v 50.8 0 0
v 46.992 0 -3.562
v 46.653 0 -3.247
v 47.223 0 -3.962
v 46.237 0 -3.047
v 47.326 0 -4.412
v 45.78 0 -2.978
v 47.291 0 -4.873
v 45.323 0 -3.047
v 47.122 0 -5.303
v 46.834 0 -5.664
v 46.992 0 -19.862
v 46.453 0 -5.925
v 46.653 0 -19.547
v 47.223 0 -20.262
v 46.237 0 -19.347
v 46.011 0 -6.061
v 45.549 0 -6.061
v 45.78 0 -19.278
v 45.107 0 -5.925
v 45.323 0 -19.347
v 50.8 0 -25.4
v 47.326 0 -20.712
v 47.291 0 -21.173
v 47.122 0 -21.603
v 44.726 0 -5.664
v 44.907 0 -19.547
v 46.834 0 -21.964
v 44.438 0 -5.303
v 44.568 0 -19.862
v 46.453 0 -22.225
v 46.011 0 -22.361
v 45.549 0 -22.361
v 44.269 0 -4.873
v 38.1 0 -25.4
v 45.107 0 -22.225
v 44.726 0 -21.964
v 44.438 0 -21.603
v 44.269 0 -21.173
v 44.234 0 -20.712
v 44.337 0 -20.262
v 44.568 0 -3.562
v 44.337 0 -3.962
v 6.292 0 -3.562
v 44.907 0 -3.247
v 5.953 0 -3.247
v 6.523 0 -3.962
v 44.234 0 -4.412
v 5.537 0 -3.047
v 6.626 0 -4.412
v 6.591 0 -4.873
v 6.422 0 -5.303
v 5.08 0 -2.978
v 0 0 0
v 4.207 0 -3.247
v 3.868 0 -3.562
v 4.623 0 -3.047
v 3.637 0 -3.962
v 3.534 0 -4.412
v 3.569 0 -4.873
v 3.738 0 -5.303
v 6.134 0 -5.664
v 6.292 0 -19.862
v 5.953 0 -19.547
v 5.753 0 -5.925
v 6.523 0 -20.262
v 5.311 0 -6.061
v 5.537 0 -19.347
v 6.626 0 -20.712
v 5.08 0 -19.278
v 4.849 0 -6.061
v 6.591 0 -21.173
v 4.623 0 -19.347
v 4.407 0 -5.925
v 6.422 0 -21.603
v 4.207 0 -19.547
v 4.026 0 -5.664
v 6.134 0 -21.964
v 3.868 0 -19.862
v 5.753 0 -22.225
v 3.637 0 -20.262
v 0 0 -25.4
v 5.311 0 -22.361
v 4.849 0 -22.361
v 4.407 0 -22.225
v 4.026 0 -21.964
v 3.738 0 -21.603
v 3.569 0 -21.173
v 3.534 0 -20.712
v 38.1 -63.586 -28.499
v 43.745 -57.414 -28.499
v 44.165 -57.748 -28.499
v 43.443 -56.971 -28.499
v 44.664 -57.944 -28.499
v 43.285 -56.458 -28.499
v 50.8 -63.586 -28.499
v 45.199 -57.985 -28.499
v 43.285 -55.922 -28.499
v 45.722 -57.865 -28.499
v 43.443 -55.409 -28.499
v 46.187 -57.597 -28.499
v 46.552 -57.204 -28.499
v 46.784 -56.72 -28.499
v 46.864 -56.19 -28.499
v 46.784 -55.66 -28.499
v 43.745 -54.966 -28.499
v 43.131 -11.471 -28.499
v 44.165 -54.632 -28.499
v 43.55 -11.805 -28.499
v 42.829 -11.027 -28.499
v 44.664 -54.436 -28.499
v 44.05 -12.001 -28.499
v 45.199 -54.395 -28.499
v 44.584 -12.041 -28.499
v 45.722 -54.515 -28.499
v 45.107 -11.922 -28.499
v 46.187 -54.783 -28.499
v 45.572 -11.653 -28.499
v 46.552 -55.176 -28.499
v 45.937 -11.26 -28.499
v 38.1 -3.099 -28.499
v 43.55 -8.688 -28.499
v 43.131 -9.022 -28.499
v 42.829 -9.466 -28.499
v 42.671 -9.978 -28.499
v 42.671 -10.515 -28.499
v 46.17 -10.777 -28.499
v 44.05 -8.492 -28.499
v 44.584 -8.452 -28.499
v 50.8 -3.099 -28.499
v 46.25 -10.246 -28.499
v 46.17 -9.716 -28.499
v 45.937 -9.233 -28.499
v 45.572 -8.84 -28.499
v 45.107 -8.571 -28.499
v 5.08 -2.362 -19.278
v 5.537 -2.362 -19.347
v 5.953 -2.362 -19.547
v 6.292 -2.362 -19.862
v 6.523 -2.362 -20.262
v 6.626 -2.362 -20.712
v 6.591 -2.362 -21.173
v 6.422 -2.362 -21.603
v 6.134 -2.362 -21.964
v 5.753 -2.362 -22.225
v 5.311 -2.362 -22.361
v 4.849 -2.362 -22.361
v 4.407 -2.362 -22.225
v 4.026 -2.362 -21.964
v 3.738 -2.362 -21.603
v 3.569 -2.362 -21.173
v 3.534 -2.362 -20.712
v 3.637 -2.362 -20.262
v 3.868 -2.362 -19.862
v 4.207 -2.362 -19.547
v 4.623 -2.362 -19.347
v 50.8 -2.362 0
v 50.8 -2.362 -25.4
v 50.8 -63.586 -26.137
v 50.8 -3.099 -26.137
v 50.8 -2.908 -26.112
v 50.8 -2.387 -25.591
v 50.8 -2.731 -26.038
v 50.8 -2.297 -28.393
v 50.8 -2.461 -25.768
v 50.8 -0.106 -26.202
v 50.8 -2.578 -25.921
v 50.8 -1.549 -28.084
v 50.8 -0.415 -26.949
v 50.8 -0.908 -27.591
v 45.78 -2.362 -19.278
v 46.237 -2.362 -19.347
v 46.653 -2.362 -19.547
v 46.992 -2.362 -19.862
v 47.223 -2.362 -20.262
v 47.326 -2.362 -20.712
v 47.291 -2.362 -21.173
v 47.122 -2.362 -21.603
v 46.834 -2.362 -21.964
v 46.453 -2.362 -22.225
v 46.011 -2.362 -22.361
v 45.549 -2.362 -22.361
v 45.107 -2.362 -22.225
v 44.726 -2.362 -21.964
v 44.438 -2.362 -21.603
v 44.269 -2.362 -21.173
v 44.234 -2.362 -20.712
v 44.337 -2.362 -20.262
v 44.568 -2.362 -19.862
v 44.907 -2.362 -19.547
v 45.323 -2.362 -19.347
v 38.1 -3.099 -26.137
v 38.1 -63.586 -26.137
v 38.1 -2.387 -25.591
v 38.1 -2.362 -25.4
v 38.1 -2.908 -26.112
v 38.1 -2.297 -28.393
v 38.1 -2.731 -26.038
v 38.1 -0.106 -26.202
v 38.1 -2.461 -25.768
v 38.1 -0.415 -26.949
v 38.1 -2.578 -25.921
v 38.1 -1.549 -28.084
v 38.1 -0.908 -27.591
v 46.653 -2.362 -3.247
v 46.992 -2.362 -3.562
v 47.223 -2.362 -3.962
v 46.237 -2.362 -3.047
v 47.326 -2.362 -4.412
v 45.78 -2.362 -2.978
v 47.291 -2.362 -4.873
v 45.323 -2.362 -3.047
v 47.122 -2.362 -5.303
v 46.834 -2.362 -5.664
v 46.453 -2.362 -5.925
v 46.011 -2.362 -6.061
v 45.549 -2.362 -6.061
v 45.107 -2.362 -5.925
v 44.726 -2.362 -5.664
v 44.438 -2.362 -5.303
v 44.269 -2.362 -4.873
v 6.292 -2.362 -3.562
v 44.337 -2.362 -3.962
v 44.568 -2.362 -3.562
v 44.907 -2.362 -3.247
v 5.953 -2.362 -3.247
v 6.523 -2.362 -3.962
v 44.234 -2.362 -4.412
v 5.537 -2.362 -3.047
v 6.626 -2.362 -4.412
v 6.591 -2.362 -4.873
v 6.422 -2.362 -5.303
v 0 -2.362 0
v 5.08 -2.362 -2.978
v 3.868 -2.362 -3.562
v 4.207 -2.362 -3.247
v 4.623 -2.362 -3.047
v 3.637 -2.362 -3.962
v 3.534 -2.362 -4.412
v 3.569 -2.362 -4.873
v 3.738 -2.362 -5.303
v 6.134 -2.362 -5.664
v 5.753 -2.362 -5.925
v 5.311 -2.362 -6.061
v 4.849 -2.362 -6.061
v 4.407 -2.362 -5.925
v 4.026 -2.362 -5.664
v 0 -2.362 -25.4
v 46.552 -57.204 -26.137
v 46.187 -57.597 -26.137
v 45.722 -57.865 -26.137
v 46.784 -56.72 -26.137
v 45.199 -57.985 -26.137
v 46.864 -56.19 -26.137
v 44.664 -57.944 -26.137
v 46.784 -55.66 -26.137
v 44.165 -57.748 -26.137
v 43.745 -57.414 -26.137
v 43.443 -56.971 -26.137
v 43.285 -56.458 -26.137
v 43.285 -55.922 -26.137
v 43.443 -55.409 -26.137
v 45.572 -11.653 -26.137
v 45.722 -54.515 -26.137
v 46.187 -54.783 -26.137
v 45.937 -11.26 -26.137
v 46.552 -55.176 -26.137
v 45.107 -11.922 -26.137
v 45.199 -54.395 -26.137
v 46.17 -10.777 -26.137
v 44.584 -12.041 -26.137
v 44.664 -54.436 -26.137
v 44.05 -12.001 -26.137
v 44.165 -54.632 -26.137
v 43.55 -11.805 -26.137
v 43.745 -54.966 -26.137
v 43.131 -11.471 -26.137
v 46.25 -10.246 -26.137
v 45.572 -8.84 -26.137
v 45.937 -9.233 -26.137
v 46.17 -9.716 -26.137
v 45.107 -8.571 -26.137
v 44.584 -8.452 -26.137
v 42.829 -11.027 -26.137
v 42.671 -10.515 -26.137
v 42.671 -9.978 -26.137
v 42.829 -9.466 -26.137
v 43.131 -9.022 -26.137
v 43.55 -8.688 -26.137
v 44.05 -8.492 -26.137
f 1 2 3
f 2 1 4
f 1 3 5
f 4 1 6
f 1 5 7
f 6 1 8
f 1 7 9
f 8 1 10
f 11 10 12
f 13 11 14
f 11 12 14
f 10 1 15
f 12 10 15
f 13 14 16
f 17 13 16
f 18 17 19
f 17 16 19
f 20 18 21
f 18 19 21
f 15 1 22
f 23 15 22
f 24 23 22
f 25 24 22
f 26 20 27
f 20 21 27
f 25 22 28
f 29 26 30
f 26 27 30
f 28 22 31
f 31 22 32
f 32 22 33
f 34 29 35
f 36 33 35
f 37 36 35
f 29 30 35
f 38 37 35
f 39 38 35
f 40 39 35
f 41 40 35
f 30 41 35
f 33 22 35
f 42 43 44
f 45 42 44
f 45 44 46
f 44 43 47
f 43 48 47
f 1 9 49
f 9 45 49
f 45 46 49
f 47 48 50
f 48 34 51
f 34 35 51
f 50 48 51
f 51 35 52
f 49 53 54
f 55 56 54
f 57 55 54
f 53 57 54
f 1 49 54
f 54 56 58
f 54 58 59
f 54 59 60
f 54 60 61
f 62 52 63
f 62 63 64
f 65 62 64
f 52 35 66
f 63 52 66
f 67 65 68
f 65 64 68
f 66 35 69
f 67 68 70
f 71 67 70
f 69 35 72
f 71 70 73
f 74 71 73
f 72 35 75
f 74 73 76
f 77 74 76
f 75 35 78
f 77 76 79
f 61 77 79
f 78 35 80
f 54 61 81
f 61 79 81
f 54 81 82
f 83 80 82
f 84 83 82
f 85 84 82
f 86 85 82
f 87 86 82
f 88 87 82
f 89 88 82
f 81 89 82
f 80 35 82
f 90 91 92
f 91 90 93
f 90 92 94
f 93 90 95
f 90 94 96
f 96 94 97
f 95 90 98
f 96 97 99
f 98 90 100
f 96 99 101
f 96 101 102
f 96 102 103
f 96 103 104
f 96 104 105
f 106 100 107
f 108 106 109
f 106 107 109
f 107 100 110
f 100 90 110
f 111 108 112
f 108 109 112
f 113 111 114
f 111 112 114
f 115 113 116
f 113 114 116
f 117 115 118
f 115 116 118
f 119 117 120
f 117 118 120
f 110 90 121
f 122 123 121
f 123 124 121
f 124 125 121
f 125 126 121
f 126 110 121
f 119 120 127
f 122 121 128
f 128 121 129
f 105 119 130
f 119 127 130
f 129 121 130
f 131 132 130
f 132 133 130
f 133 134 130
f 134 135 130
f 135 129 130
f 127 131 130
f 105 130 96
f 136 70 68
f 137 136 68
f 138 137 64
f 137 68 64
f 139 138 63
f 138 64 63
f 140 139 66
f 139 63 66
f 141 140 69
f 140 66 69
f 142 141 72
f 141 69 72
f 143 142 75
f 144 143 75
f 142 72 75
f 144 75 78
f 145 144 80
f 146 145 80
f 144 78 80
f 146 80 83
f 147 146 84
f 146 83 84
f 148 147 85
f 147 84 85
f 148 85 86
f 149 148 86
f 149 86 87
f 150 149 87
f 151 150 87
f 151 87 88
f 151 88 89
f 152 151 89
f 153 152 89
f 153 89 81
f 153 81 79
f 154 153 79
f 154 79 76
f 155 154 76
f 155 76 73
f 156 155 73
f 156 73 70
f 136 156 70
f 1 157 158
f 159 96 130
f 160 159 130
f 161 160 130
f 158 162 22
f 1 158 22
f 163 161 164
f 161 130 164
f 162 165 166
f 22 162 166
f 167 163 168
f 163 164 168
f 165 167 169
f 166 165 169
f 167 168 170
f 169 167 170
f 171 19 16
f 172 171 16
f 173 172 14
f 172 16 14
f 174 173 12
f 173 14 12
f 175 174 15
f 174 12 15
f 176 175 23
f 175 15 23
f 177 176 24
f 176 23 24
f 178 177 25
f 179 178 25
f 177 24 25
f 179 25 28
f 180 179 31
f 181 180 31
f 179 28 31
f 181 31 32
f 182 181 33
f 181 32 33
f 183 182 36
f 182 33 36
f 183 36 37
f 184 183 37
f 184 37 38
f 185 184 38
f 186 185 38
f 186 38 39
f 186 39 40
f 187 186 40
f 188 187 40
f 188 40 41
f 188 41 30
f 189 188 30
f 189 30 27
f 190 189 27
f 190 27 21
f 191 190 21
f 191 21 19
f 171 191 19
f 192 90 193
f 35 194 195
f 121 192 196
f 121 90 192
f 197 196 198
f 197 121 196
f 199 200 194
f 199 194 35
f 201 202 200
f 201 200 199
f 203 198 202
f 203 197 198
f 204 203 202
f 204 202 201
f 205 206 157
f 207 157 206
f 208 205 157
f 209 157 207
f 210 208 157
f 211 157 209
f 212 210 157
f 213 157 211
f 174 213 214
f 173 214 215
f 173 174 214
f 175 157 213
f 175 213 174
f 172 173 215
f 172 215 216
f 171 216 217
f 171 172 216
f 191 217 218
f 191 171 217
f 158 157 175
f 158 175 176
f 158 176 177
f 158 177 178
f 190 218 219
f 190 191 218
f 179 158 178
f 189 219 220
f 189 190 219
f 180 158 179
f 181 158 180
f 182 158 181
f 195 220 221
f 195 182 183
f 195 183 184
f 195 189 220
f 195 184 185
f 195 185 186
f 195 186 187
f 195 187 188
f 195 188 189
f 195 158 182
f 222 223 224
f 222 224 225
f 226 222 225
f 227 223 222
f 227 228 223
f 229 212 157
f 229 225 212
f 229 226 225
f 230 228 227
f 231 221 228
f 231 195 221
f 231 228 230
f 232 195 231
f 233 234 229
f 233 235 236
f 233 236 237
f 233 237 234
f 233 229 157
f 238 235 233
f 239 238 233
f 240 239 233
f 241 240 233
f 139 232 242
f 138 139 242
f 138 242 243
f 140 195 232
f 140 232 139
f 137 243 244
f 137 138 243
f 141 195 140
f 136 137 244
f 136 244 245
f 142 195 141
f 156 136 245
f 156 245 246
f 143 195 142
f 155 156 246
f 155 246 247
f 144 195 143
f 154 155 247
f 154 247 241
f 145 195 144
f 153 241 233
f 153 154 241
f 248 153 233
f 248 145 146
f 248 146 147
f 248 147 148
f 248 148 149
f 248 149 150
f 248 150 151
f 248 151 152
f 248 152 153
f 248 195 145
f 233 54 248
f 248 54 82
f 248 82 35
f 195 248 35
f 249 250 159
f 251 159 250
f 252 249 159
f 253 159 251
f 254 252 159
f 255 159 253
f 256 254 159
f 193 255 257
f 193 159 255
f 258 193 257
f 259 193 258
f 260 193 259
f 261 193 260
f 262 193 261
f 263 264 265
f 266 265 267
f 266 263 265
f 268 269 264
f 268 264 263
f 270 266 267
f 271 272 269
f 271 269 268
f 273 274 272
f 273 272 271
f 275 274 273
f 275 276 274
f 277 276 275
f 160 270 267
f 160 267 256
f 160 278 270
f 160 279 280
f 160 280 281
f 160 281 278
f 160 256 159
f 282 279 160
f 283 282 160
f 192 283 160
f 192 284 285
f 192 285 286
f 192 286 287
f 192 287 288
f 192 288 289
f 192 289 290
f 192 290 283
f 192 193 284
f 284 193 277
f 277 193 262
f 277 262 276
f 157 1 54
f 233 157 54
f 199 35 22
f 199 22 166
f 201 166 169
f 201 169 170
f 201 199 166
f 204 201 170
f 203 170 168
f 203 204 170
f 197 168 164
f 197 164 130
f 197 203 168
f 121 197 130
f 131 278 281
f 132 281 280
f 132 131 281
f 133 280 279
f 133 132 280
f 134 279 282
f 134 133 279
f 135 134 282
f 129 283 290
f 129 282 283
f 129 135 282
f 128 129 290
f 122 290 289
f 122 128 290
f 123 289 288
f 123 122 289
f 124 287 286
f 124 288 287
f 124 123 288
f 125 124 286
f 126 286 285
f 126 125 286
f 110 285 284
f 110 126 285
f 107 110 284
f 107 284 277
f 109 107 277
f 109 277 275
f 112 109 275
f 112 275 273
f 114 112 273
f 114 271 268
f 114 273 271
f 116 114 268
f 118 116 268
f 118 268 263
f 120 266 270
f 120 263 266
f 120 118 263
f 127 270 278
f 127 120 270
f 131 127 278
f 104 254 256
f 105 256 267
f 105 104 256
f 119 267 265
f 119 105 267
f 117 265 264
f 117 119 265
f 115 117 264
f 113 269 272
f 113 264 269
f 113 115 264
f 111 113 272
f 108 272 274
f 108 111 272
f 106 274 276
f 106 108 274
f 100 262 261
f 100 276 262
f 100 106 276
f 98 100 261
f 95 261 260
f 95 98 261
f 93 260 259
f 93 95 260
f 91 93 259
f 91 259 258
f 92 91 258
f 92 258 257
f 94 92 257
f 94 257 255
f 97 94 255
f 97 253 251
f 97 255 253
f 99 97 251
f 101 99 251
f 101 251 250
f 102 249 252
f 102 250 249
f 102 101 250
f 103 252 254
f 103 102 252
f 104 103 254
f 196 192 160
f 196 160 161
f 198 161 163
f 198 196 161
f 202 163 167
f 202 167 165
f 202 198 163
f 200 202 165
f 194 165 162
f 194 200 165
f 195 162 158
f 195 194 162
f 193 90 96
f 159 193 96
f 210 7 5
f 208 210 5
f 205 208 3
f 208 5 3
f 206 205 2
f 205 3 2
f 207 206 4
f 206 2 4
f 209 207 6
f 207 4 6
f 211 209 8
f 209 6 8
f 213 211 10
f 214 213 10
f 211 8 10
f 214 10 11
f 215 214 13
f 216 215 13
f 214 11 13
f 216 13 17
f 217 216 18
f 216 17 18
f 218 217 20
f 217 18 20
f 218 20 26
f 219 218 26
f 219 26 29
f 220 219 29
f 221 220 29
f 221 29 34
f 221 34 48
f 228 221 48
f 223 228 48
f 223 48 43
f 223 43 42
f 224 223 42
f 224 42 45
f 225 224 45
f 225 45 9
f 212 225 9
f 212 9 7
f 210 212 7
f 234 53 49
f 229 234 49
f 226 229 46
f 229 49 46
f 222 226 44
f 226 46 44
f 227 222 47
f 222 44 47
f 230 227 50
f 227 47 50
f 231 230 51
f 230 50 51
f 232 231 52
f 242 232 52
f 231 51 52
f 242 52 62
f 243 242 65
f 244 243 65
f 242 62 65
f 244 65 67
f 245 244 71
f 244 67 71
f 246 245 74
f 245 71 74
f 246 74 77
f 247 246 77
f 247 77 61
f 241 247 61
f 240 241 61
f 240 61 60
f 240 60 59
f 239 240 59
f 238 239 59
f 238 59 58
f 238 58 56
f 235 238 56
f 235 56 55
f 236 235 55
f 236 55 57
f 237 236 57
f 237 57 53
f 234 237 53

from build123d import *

# Parameters (mm, degrees)
SKETCH1_R                  = 1.79959
BASE_FLANGE1_DEPTH         = 2.3622
SKETCHED_START             = -88.9
SKETCHED_BEND1_OUTLINE_W   = 12.7
SKETCHED_BEND1_OUTLINE_H   = 2.3622
SKETCHED_BEND1_DEPTH       = 60.4012
SKETCHED_START_2           = -28.197410712
SKETCHED_BEND1_2_OUTLINE_W = 12.7
SKETCHED_BEND1_2_OUTLINE_H = 61.224283884
SKETCHED_BEND1_2_OUTLINE_R = 1.79959
SKETCHED_BEND1_2_DEPTH     = 2.060810712
SKETCHED_START_3           = -28.4988
SKETCHED_BEND1_3_OUTLINE_W = 12.7
SKETCHED_BEND1_3_OUTLINE_H = 61.224283884
SKETCHED_BEND1_3_OUTLINE_R = 1.79959
SKETCHED_BEND1_3_DEPTH     = 3.0988
SKETCHED_START_4           = 38.1
SKETCHED_BEND1_4_DEPTH     = 12.7
CUT_EXTRUDE1_REACH         = 88.233
SKETCH7_R                  = 1.55


with BuildPart() as part:
    # Base-Flange1: sheet metal written as solids
    # Sketch1 → Base-Flange1 (new body)
    with BuildSketch(Plane(origin=(0, 0, 0), x_dir=(1, 0, 0), z_dir=(0, 1, 0))):
        Polygon((50.8, 88.9), (50.8, 0), (0, 0), (0, 25.4), (38.1, 25.4), (38.1, 88.9), align=None)
        with Locations(Location((45.06468, 81.50352, 0), (0, 0, 270))):
            Circle(SKETCH1_R, mode=Mode.SUBTRACT)
        with Locations(Location((44.45, 35.56, 0), (0, 0, 270))):
            Circle(SKETCH1_R, mode=Mode.SUBTRACT)
    extrude(amount=-BASE_FLANGE1_DEPTH)

    # Sketched Bend1: read off the stored shape, not the designer's step
    # Sketched Bend1 outline → Sketched Bend1 (cut)
    with BuildSketch(Plane.XY.offset(SKETCHED_START)):
        with Locations((44.45, -1.1811)):
            Rectangle(SKETCHED_BEND1_OUTLINE_W, SKETCHED_BEND1_OUTLINE_H)
    extrude(amount=SKETCHED_BEND1_DEPTH, mode=Mode.SUBTRACT)

    # Sketched Bend1 2 outline → Sketched Bend1 2 (add)
    with BuildSketch(Plane.XY.offset(SKETCHED_START_2)):
        with Locations((44.45, -32.974341942)):
            Rectangle(SKETCHED_BEND1_2_OUTLINE_W, SKETCHED_BEND1_2_OUTLINE_H)
        with Locations((45.06468, -56.190003884)):
            Circle(SKETCHED_BEND1_2_OUTLINE_R, mode=Mode.SUBTRACT)
        with Locations((44.45, -10.246483884)):
            Circle(SKETCHED_BEND1_2_OUTLINE_R, mode=Mode.SUBTRACT)
    extrude(amount=SKETCHED_BEND1_2_DEPTH)

    # Sketched Bend1 3 outline → Sketched Bend1 3 (add)
    with BuildSketch(Plane.XY.offset(SKETCHED_START_3)):
        with Locations((44.45, -32.974341942)):
            Rectangle(SKETCHED_BEND1_3_OUTLINE_W, SKETCHED_BEND1_3_OUTLINE_H)
        with Locations((45.06468, -56.190003884)):
            Circle(SKETCHED_BEND1_3_OUTLINE_R, mode=Mode.SUBTRACT)
        with Locations((44.45, -10.246483884)):
            Circle(SKETCHED_BEND1_3_OUTLINE_R, mode=Mode.SUBTRACT)
    extrude(amount=SKETCHED_BEND1_3_DEPTH)

    # Sketched Bend1 4 outline → Sketched Bend1 4 (cut)
    with BuildSketch(Plane.YZ.offset(SKETCHED_START_4)):
        with BuildLine():
            ThreePointArc((0, -25.4), (-0.907617506, -27.591182494), (-3.0988, -28.4988))
            Line((-3.0988, -28.4988), (0, -28.4988))
            Line((0, -28.4988), (0, -25.4))
        make_face()
        with BuildLine():
            Line((-63.586483884, -26.1366), (-3.0988, -26.1366))
            ThreePointArc((-3.0988, -26.1366), (-2.577945145, -25.920854855), (-2.3622, -25.4))
            Line((-2.3622, -25.4), (-63.586483884, -25.4))
            Line((-63.586483884, -25.4), (-63.586483884, -26.1366))
        make_face()
    extrude(amount=SKETCHED_BEND1_4_DEPTH, mode=Mode.SUBTRACT)

    # Sketch7 → Cut-Extrude1 (cut, up to next)
    with BuildSketch(Plane(origin=(0, 0, 0), x_dir=(1, 0, 0), z_dir=(0, 1, 0)), mode=Mode.PRIVATE) as cut_extrude1_sk1:
        with Locations(Location((45.78, 20.828, 0), (0, 0, 270))):
            Circle(SKETCH7_R)
    cut_extrude1_tool1 = extrude(cut_extrude1_sk1.sketch, amount=-CUT_EXTRUDE1_REACH, mode=Mode.PRIVATE) & part.part
    # Sketch7 → Cut-Extrude1 (cut, up to next)
    with BuildSketch(Plane(origin=(0, 0, 0), x_dir=(1, 0, 0), z_dir=(0, 1, 0)), mode=Mode.PRIVATE) as cut_extrude1_sk2:
        with Locations(Location((5.08, 4.528, 0), (0, 0, 270))):
            Circle(SKETCH7_R)
    cut_extrude1_tool2 = extrude(cut_extrude1_sk2.sketch, amount=-CUT_EXTRUDE1_REACH, mode=Mode.PRIVATE) & part.part
    # Sketch7 → Cut-Extrude1 (cut, up to next)
    with BuildSketch(Plane(origin=(0, 0, 0), x_dir=(1, 0, 0), z_dir=(0, 1, 0)), mode=Mode.PRIVATE) as cut_extrude1_sk3:
        with Locations(Location((45.78, 4.528, 0), (0, 0, 270))):
            Circle(SKETCH7_R)
    cut_extrude1_tool3 = extrude(cut_extrude1_sk3.sketch, amount=-CUT_EXTRUDE1_REACH, mode=Mode.PRIVATE) & part.part
    # Sketch7 → Cut-Extrude1 (cut, up to next)
    with BuildSketch(Plane(origin=(0, 0, 0), x_dir=(1, 0, 0), z_dir=(0, 1, 0)), mode=Mode.PRIVATE) as cut_extrude1_sk4:
        with Locations(Location((5.08, 20.828, 0), (0, 0, 270))):
            Circle(SKETCH7_R)
    cut_extrude1_tool4 = extrude(cut_extrude1_sk4.sketch, amount=-CUT_EXTRUDE1_REACH, mode=Mode.PRIVATE) & part.part
    add(cut_extrude1_tool1.solids().sort_by_distance((45.78, 0, -20.828))[0], mode=Mode.SUBTRACT)
    add(cut_extrude1_tool2.solids().sort_by_distance((5.08, 0, -4.528))[0], mode=Mode.SUBTRACT)
    add(cut_extrude1_tool3.solids().sort_by_distance((45.78, 0, -4.528))[0], mode=Mode.SUBTRACT)
    add(cut_extrude1_tool4.solids().sort_by_distance((5.08, 0, -20.828))[0], mode=Mode.SUBTRACT)


solid = part.part
